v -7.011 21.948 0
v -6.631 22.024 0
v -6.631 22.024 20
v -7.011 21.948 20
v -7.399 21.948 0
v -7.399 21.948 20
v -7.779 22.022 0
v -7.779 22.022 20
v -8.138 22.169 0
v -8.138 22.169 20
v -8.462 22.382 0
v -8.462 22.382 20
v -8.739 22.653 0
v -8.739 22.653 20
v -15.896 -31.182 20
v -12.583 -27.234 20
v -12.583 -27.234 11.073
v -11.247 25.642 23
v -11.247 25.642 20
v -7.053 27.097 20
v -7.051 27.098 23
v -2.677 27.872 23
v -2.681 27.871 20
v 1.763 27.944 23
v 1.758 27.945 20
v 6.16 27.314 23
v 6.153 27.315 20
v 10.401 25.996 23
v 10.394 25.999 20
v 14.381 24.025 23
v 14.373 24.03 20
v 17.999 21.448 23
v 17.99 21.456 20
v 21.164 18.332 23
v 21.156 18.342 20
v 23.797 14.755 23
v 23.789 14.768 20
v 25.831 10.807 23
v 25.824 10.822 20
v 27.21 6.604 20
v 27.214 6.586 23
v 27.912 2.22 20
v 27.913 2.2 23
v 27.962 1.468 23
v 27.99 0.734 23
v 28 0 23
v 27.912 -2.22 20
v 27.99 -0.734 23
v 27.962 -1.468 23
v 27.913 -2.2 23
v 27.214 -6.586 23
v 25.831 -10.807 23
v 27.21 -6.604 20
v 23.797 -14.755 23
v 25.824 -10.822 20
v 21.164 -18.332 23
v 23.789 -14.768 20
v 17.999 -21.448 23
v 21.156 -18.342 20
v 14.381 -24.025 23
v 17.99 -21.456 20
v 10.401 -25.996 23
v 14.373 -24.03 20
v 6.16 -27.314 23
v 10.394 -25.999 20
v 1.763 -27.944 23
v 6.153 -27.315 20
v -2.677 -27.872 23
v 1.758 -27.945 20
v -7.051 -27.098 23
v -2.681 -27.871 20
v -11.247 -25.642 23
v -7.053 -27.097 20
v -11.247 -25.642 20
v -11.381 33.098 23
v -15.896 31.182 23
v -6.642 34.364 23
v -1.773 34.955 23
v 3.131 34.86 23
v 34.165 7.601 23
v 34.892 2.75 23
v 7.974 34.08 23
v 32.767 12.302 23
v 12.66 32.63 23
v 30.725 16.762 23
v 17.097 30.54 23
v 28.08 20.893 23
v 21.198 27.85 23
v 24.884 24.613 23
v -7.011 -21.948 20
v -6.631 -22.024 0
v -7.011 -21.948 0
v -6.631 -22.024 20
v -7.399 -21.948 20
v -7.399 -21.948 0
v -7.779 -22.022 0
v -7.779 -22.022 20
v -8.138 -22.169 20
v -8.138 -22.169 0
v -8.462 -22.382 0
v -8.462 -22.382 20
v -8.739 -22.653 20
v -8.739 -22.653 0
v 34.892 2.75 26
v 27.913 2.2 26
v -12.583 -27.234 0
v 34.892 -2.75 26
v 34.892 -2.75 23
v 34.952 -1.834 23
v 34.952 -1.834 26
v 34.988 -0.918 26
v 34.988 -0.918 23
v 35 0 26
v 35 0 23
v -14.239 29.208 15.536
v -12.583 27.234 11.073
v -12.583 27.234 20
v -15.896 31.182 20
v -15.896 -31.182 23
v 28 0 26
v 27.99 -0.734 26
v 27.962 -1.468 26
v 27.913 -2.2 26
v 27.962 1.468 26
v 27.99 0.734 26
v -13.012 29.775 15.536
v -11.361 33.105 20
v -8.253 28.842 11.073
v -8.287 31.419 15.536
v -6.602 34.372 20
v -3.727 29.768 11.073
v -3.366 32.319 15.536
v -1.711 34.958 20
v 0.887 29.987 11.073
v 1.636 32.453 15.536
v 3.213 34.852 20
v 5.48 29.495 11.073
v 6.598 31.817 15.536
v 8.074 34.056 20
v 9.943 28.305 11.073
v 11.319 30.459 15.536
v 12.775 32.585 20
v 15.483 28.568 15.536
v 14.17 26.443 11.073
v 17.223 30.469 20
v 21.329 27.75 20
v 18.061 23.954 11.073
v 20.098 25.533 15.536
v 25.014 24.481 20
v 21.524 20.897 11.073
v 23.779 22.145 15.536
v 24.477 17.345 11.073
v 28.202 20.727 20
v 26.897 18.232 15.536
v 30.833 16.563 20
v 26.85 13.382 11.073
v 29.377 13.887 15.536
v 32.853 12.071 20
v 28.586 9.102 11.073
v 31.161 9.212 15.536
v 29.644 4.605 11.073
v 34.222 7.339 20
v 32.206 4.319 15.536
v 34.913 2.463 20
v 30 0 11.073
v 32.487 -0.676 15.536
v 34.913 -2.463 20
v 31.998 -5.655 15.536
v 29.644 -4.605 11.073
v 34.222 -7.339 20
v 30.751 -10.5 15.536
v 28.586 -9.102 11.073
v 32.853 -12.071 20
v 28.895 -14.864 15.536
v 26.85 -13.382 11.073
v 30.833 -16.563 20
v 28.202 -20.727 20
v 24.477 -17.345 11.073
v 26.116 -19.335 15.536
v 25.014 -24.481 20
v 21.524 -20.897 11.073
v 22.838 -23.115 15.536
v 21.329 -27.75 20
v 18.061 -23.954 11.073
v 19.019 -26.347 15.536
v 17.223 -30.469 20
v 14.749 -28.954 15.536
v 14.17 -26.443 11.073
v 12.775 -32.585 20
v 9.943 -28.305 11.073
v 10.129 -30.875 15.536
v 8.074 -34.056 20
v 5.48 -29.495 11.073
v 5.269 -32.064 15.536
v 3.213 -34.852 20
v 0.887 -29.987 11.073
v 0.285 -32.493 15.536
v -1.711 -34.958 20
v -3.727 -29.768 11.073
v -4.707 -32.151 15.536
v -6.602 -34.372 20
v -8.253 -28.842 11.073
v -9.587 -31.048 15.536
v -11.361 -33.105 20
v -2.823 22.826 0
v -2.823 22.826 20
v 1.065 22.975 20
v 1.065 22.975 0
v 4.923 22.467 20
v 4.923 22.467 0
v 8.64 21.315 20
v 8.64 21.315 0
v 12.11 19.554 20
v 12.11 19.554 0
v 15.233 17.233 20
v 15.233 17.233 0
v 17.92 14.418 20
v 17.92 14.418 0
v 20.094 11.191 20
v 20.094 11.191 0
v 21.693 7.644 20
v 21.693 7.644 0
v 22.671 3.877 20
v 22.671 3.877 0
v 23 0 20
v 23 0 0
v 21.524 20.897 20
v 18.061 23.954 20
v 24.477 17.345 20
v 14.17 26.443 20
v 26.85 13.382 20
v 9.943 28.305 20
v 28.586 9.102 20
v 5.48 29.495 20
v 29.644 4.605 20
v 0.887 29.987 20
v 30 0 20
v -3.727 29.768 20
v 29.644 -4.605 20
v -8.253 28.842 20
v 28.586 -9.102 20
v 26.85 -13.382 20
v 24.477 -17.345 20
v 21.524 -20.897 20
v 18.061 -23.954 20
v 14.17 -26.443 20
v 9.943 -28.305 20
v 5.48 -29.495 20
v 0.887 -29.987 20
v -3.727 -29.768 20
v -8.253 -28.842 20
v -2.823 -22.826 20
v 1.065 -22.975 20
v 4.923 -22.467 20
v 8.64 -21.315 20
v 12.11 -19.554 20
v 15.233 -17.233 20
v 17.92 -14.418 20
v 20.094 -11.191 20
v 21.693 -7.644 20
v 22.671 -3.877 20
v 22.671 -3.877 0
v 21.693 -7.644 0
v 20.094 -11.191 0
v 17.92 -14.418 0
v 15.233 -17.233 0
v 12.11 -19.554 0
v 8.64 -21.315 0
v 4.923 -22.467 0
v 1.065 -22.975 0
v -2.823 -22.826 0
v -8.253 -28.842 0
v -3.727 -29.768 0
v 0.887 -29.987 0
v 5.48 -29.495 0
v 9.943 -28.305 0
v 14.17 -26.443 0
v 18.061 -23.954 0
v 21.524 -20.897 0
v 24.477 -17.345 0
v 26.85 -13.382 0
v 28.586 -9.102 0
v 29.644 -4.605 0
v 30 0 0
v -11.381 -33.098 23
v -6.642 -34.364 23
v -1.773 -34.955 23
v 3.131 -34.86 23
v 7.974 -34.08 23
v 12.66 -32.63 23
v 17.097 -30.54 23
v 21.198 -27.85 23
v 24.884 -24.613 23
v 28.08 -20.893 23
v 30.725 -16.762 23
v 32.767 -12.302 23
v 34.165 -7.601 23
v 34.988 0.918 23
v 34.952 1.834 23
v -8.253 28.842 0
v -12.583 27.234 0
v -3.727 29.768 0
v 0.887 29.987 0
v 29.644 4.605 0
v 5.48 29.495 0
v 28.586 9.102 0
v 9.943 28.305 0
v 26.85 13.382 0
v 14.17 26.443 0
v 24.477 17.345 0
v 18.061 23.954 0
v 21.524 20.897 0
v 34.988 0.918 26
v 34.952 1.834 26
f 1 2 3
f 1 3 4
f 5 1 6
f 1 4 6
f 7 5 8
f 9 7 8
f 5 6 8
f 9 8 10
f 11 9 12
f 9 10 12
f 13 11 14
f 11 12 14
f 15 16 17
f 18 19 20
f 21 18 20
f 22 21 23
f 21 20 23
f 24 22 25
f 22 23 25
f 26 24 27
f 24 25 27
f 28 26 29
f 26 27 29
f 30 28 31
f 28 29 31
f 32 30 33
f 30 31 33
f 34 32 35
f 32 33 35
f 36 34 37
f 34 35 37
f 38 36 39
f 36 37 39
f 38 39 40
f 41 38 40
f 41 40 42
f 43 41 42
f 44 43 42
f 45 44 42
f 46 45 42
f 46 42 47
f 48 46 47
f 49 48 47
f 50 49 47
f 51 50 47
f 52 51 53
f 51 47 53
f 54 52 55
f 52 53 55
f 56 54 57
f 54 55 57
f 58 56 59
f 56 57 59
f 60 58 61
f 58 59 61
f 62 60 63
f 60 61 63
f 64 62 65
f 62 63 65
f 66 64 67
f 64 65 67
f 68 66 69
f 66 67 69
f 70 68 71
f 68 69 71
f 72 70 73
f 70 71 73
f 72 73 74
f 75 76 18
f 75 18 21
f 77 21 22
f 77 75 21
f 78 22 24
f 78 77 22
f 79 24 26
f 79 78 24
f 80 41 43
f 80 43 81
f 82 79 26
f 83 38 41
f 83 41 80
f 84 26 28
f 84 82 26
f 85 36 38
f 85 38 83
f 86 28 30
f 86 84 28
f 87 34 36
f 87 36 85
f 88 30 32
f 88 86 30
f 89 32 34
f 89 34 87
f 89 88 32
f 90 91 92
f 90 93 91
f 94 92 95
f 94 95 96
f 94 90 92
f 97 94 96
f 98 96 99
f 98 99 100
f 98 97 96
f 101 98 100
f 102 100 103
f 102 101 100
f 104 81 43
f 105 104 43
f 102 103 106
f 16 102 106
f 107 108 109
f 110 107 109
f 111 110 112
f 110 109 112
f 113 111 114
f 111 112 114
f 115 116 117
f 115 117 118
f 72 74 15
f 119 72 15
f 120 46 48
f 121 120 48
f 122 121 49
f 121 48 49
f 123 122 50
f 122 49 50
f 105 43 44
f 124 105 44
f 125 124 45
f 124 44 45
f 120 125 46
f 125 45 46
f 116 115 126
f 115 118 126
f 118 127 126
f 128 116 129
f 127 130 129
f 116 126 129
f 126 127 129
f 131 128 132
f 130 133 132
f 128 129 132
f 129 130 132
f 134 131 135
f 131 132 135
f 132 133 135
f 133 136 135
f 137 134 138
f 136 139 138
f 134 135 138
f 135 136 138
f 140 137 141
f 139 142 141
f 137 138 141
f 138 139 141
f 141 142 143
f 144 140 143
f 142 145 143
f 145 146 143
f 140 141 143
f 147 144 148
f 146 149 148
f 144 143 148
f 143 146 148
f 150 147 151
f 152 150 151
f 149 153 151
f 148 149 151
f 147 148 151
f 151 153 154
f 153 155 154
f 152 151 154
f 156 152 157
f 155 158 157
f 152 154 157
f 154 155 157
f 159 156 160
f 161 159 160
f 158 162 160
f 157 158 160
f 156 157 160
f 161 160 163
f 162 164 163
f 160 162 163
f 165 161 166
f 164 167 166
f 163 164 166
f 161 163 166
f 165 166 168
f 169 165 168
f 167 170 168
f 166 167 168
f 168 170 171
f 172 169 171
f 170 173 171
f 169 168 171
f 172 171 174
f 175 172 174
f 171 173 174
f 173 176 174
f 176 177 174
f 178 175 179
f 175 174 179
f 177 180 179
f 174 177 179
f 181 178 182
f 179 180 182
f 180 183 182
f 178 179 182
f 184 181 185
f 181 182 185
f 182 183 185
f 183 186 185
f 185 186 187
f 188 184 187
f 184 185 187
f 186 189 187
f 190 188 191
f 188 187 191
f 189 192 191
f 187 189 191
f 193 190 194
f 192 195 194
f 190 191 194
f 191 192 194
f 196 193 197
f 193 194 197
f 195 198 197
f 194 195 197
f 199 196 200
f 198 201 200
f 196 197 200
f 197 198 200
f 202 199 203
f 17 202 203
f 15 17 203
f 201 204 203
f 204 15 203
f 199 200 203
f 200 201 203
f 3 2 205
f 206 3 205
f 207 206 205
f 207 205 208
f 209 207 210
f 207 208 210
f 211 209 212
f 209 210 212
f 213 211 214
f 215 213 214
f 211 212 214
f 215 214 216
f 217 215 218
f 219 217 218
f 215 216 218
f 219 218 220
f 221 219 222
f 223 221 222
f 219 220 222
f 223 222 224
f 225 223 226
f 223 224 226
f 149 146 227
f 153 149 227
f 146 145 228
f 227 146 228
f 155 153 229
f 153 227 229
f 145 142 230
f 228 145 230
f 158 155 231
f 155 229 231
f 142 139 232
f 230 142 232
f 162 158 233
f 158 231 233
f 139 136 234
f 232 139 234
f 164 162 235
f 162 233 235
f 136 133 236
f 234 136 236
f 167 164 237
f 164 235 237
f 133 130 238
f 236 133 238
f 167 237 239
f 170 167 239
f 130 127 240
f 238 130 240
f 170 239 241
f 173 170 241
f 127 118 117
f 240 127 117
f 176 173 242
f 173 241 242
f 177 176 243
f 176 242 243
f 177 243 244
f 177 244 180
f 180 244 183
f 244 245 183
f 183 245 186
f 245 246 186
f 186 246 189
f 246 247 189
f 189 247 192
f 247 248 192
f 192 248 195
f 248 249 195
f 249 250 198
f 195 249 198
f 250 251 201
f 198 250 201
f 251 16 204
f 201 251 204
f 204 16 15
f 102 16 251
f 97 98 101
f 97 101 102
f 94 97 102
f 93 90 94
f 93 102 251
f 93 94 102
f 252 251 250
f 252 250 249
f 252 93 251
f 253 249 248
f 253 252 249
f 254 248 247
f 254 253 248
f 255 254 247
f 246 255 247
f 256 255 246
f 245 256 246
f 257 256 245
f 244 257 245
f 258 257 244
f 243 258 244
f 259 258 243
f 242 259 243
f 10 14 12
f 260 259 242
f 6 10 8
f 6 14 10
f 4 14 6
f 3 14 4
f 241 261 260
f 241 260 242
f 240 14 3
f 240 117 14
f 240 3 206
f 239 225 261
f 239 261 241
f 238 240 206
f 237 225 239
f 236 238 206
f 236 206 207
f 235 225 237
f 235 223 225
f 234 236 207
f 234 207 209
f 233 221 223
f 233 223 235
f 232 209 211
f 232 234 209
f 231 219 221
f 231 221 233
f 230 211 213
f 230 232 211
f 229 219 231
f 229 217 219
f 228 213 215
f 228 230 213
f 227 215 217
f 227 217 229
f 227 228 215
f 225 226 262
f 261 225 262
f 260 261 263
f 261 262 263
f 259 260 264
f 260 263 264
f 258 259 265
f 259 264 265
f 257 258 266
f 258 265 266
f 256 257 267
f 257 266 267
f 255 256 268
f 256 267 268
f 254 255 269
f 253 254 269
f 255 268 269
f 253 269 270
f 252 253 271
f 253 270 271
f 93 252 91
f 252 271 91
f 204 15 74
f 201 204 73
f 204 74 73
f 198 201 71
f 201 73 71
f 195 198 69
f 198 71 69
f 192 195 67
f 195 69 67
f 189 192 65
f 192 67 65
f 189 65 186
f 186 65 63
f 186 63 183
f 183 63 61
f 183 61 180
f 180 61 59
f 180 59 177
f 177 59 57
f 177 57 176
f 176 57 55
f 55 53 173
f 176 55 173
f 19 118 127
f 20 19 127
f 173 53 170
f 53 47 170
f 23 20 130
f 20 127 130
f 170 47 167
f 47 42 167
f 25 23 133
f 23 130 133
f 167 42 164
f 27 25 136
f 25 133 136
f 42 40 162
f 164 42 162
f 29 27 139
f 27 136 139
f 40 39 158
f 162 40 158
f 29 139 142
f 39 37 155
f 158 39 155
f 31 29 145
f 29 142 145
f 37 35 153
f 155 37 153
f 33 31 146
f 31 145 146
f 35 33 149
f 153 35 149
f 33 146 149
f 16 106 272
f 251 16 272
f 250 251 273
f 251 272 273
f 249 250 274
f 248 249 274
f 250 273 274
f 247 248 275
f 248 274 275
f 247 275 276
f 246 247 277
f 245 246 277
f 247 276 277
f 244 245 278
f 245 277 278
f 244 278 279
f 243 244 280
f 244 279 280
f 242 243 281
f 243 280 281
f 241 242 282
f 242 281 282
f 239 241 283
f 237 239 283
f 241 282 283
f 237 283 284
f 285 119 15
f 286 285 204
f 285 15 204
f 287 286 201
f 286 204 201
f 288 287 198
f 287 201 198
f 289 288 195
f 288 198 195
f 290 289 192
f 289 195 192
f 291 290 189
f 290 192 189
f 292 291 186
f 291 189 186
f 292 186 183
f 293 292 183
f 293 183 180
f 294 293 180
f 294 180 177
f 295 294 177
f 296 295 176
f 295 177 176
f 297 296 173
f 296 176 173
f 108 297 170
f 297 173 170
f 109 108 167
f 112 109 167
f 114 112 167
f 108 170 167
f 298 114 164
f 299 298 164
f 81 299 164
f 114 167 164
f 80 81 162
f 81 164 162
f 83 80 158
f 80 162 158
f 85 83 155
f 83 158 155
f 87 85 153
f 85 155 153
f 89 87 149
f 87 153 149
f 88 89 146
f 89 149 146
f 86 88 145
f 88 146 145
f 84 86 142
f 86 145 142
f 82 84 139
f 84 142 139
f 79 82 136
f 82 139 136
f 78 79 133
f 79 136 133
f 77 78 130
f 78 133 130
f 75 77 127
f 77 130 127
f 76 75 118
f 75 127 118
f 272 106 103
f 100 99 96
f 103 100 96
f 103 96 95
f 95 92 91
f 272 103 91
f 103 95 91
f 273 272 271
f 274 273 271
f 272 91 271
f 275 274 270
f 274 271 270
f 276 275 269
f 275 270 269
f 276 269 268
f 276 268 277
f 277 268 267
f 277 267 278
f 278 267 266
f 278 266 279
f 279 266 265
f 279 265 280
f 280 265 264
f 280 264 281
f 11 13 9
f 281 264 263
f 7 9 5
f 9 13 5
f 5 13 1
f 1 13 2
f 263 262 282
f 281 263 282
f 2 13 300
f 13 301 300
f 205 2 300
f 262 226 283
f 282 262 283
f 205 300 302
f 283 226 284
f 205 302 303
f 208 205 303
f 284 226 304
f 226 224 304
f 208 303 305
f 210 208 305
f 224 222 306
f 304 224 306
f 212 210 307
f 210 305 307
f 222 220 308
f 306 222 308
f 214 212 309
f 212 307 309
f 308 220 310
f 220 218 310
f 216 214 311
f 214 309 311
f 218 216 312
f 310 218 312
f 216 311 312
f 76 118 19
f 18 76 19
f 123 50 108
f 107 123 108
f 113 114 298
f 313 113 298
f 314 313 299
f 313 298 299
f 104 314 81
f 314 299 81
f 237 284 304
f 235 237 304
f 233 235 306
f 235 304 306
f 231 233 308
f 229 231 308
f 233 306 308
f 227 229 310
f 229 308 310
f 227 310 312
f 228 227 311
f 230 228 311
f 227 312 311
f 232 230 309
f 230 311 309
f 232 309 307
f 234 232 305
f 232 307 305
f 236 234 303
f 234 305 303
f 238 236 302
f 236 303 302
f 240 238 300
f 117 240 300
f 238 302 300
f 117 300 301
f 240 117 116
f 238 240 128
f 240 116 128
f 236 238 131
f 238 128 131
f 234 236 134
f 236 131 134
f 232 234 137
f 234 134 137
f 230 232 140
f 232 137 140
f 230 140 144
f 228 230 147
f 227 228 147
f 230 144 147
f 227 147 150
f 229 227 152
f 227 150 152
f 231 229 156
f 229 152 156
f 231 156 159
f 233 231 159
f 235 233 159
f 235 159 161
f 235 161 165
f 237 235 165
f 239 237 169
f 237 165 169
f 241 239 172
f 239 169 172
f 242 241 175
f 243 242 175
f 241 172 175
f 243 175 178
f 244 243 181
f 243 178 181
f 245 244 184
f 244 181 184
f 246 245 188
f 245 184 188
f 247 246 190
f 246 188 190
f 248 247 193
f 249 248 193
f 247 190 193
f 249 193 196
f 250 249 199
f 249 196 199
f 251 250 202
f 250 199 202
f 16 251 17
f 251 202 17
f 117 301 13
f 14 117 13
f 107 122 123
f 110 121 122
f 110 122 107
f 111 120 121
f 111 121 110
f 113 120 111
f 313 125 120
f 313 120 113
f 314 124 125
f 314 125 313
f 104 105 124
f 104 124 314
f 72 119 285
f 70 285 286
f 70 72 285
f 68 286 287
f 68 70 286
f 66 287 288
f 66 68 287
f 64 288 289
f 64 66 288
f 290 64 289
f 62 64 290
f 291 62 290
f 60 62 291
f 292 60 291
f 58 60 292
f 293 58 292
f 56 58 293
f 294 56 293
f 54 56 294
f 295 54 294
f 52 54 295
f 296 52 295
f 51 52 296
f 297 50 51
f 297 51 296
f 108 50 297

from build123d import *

# Parameters (mm, degrees)
F1_DEPTH  = 20
F3_DEPTH  = 3
F7_DEPTH  = 3
F8_R      = 2
F9_R      = 2
F11_DEPTH = 25


with BuildPart() as f1:
    # F0 (on Top) → F1 (new body)
    with BuildSketch(Plane.XY):
        with BuildLine():
            ThreePointArc((-7.8664632965, 21.6129302781), (13.1922580361, 18.8404970186), (23, 0))
            ThreePointArc((23, 0), (13.1922580361, -18.8404970186), (-7.8664632965, -21.6129302781))
            Line((-7.8664632965, -21.6129302781), (-12.5828212645, -27.2336668304))
            ThreePointArc((-12.5828212645, -27.2336668304), (16.1634674817, -25.2733519535), (30, 0))
            ThreePointArc((30, 0), (16.1634674817, 25.2733519535), (-12.5828212645, 27.2336668304))
            Line((-12.5828212645, 27.2336668304), (-7.8664632965, 21.6129302781))
        make_face()
    extrude(amount=F1_DEPTH)

    # F8
    f8_edges = [f1.edges().sort_by_distance(p)[0] for p in [
        (-7.866463, 21.61293, 10),
    ]]
    fillet(f8_edges, radius=F8_R)

    # F9
    f9_edges = [f1.edges().sort_by_distance(p)[0] for p in [
        (-7.866463, -21.61293, 10),
    ]]
    fillet(f9_edges, radius=F9_R)


with BuildPart() as f3:
    # F2 (on face) → F3 (new body)
    with BuildSketch(Plane.XY.offset(20)):
        with BuildLine():
            Line((-15.8959068315, 31.1820484575), (-11.2471000335, 25.6418162546))
            ThreePointArc((-11.2471000335, 25.6418162546), (28, 0), (-11.2471000335, -25.6418162546))
            Line((-11.2471000335, -25.6418162546), (-15.8959068315, -31.1820484575))
            ThreePointArc((-15.8959068315, -31.1820484575), (35, 0), (-15.8959068315, 31.1820484575))
        make_face()
    extrude(amount=F3_DEPTH)

    # F6 (on face) → F7 (join)
    with BuildSketch(Plane.XY.offset(23)):
        with BuildLine():
            Line((34.8917970302, 2.75), (27.9134376242, 2.2))
            ThreePointArc((27.9134376242, 2.2), (27.9783510368, 1.1008511531), (28, 0))
            ThreePointArc((28, 0), (27.9783510368, -1.1008511531), (27.9134376242, -2.2))
            Line((27.9134376242, -2.2), (34.8917970302, -2.75))
            ThreePointArc((34.8917970302, -2.75), (34.972938796, -1.3760639413), (35, 0))
            ThreePointArc((35, 0), (34.972938796, 1.3760639413), (34.8917970302, 2.75))
        make_face()
    extrude(amount=F7_DEPTH)


with BuildPart() as f5:
    # F5: sweep along a path in F5_path
    with BuildLine(Plane(origin=(-15.8959068315, 31.1820484575, 20), x_dir=(0, -1, 0), z_dir=(0, 0, -1))) as f5_path:
        ThreePointArc((0, 0), (31.1820484575, -50.8959068315), (62.3640969149, 0))
    # F4 (on face) → F5 (sweep)
    with BuildSketch(Plane(origin=(6.0260604953, -5.056465139, 0), x_dir=(-0.6427876097, -0.7660444431, 0), z_dir=(-0.7660444431, 0.6427876097, 0))):
        Polygon((34.1045269019, 20), (28.9502807448, 20), (28.9502807448, 11.0725837812), align=None)
    sweep(path=f5_path.line)

    # F10 (on face) → F11 (cut)
    with BuildSketch(Plane.XY.offset(23)):
        Polygon((-21.7447763936, 19.3639848703), (-11.2471000335, 25.6418162546), (-15.8959068315, 31.1820484575), (-25.9897373727, 26.0364407186), align=None)
    extrude(amount=-F11_DEPTH, mode=Mode.SUBTRACT)


solid = Compound([f1.part, f3.part, f5.part])
